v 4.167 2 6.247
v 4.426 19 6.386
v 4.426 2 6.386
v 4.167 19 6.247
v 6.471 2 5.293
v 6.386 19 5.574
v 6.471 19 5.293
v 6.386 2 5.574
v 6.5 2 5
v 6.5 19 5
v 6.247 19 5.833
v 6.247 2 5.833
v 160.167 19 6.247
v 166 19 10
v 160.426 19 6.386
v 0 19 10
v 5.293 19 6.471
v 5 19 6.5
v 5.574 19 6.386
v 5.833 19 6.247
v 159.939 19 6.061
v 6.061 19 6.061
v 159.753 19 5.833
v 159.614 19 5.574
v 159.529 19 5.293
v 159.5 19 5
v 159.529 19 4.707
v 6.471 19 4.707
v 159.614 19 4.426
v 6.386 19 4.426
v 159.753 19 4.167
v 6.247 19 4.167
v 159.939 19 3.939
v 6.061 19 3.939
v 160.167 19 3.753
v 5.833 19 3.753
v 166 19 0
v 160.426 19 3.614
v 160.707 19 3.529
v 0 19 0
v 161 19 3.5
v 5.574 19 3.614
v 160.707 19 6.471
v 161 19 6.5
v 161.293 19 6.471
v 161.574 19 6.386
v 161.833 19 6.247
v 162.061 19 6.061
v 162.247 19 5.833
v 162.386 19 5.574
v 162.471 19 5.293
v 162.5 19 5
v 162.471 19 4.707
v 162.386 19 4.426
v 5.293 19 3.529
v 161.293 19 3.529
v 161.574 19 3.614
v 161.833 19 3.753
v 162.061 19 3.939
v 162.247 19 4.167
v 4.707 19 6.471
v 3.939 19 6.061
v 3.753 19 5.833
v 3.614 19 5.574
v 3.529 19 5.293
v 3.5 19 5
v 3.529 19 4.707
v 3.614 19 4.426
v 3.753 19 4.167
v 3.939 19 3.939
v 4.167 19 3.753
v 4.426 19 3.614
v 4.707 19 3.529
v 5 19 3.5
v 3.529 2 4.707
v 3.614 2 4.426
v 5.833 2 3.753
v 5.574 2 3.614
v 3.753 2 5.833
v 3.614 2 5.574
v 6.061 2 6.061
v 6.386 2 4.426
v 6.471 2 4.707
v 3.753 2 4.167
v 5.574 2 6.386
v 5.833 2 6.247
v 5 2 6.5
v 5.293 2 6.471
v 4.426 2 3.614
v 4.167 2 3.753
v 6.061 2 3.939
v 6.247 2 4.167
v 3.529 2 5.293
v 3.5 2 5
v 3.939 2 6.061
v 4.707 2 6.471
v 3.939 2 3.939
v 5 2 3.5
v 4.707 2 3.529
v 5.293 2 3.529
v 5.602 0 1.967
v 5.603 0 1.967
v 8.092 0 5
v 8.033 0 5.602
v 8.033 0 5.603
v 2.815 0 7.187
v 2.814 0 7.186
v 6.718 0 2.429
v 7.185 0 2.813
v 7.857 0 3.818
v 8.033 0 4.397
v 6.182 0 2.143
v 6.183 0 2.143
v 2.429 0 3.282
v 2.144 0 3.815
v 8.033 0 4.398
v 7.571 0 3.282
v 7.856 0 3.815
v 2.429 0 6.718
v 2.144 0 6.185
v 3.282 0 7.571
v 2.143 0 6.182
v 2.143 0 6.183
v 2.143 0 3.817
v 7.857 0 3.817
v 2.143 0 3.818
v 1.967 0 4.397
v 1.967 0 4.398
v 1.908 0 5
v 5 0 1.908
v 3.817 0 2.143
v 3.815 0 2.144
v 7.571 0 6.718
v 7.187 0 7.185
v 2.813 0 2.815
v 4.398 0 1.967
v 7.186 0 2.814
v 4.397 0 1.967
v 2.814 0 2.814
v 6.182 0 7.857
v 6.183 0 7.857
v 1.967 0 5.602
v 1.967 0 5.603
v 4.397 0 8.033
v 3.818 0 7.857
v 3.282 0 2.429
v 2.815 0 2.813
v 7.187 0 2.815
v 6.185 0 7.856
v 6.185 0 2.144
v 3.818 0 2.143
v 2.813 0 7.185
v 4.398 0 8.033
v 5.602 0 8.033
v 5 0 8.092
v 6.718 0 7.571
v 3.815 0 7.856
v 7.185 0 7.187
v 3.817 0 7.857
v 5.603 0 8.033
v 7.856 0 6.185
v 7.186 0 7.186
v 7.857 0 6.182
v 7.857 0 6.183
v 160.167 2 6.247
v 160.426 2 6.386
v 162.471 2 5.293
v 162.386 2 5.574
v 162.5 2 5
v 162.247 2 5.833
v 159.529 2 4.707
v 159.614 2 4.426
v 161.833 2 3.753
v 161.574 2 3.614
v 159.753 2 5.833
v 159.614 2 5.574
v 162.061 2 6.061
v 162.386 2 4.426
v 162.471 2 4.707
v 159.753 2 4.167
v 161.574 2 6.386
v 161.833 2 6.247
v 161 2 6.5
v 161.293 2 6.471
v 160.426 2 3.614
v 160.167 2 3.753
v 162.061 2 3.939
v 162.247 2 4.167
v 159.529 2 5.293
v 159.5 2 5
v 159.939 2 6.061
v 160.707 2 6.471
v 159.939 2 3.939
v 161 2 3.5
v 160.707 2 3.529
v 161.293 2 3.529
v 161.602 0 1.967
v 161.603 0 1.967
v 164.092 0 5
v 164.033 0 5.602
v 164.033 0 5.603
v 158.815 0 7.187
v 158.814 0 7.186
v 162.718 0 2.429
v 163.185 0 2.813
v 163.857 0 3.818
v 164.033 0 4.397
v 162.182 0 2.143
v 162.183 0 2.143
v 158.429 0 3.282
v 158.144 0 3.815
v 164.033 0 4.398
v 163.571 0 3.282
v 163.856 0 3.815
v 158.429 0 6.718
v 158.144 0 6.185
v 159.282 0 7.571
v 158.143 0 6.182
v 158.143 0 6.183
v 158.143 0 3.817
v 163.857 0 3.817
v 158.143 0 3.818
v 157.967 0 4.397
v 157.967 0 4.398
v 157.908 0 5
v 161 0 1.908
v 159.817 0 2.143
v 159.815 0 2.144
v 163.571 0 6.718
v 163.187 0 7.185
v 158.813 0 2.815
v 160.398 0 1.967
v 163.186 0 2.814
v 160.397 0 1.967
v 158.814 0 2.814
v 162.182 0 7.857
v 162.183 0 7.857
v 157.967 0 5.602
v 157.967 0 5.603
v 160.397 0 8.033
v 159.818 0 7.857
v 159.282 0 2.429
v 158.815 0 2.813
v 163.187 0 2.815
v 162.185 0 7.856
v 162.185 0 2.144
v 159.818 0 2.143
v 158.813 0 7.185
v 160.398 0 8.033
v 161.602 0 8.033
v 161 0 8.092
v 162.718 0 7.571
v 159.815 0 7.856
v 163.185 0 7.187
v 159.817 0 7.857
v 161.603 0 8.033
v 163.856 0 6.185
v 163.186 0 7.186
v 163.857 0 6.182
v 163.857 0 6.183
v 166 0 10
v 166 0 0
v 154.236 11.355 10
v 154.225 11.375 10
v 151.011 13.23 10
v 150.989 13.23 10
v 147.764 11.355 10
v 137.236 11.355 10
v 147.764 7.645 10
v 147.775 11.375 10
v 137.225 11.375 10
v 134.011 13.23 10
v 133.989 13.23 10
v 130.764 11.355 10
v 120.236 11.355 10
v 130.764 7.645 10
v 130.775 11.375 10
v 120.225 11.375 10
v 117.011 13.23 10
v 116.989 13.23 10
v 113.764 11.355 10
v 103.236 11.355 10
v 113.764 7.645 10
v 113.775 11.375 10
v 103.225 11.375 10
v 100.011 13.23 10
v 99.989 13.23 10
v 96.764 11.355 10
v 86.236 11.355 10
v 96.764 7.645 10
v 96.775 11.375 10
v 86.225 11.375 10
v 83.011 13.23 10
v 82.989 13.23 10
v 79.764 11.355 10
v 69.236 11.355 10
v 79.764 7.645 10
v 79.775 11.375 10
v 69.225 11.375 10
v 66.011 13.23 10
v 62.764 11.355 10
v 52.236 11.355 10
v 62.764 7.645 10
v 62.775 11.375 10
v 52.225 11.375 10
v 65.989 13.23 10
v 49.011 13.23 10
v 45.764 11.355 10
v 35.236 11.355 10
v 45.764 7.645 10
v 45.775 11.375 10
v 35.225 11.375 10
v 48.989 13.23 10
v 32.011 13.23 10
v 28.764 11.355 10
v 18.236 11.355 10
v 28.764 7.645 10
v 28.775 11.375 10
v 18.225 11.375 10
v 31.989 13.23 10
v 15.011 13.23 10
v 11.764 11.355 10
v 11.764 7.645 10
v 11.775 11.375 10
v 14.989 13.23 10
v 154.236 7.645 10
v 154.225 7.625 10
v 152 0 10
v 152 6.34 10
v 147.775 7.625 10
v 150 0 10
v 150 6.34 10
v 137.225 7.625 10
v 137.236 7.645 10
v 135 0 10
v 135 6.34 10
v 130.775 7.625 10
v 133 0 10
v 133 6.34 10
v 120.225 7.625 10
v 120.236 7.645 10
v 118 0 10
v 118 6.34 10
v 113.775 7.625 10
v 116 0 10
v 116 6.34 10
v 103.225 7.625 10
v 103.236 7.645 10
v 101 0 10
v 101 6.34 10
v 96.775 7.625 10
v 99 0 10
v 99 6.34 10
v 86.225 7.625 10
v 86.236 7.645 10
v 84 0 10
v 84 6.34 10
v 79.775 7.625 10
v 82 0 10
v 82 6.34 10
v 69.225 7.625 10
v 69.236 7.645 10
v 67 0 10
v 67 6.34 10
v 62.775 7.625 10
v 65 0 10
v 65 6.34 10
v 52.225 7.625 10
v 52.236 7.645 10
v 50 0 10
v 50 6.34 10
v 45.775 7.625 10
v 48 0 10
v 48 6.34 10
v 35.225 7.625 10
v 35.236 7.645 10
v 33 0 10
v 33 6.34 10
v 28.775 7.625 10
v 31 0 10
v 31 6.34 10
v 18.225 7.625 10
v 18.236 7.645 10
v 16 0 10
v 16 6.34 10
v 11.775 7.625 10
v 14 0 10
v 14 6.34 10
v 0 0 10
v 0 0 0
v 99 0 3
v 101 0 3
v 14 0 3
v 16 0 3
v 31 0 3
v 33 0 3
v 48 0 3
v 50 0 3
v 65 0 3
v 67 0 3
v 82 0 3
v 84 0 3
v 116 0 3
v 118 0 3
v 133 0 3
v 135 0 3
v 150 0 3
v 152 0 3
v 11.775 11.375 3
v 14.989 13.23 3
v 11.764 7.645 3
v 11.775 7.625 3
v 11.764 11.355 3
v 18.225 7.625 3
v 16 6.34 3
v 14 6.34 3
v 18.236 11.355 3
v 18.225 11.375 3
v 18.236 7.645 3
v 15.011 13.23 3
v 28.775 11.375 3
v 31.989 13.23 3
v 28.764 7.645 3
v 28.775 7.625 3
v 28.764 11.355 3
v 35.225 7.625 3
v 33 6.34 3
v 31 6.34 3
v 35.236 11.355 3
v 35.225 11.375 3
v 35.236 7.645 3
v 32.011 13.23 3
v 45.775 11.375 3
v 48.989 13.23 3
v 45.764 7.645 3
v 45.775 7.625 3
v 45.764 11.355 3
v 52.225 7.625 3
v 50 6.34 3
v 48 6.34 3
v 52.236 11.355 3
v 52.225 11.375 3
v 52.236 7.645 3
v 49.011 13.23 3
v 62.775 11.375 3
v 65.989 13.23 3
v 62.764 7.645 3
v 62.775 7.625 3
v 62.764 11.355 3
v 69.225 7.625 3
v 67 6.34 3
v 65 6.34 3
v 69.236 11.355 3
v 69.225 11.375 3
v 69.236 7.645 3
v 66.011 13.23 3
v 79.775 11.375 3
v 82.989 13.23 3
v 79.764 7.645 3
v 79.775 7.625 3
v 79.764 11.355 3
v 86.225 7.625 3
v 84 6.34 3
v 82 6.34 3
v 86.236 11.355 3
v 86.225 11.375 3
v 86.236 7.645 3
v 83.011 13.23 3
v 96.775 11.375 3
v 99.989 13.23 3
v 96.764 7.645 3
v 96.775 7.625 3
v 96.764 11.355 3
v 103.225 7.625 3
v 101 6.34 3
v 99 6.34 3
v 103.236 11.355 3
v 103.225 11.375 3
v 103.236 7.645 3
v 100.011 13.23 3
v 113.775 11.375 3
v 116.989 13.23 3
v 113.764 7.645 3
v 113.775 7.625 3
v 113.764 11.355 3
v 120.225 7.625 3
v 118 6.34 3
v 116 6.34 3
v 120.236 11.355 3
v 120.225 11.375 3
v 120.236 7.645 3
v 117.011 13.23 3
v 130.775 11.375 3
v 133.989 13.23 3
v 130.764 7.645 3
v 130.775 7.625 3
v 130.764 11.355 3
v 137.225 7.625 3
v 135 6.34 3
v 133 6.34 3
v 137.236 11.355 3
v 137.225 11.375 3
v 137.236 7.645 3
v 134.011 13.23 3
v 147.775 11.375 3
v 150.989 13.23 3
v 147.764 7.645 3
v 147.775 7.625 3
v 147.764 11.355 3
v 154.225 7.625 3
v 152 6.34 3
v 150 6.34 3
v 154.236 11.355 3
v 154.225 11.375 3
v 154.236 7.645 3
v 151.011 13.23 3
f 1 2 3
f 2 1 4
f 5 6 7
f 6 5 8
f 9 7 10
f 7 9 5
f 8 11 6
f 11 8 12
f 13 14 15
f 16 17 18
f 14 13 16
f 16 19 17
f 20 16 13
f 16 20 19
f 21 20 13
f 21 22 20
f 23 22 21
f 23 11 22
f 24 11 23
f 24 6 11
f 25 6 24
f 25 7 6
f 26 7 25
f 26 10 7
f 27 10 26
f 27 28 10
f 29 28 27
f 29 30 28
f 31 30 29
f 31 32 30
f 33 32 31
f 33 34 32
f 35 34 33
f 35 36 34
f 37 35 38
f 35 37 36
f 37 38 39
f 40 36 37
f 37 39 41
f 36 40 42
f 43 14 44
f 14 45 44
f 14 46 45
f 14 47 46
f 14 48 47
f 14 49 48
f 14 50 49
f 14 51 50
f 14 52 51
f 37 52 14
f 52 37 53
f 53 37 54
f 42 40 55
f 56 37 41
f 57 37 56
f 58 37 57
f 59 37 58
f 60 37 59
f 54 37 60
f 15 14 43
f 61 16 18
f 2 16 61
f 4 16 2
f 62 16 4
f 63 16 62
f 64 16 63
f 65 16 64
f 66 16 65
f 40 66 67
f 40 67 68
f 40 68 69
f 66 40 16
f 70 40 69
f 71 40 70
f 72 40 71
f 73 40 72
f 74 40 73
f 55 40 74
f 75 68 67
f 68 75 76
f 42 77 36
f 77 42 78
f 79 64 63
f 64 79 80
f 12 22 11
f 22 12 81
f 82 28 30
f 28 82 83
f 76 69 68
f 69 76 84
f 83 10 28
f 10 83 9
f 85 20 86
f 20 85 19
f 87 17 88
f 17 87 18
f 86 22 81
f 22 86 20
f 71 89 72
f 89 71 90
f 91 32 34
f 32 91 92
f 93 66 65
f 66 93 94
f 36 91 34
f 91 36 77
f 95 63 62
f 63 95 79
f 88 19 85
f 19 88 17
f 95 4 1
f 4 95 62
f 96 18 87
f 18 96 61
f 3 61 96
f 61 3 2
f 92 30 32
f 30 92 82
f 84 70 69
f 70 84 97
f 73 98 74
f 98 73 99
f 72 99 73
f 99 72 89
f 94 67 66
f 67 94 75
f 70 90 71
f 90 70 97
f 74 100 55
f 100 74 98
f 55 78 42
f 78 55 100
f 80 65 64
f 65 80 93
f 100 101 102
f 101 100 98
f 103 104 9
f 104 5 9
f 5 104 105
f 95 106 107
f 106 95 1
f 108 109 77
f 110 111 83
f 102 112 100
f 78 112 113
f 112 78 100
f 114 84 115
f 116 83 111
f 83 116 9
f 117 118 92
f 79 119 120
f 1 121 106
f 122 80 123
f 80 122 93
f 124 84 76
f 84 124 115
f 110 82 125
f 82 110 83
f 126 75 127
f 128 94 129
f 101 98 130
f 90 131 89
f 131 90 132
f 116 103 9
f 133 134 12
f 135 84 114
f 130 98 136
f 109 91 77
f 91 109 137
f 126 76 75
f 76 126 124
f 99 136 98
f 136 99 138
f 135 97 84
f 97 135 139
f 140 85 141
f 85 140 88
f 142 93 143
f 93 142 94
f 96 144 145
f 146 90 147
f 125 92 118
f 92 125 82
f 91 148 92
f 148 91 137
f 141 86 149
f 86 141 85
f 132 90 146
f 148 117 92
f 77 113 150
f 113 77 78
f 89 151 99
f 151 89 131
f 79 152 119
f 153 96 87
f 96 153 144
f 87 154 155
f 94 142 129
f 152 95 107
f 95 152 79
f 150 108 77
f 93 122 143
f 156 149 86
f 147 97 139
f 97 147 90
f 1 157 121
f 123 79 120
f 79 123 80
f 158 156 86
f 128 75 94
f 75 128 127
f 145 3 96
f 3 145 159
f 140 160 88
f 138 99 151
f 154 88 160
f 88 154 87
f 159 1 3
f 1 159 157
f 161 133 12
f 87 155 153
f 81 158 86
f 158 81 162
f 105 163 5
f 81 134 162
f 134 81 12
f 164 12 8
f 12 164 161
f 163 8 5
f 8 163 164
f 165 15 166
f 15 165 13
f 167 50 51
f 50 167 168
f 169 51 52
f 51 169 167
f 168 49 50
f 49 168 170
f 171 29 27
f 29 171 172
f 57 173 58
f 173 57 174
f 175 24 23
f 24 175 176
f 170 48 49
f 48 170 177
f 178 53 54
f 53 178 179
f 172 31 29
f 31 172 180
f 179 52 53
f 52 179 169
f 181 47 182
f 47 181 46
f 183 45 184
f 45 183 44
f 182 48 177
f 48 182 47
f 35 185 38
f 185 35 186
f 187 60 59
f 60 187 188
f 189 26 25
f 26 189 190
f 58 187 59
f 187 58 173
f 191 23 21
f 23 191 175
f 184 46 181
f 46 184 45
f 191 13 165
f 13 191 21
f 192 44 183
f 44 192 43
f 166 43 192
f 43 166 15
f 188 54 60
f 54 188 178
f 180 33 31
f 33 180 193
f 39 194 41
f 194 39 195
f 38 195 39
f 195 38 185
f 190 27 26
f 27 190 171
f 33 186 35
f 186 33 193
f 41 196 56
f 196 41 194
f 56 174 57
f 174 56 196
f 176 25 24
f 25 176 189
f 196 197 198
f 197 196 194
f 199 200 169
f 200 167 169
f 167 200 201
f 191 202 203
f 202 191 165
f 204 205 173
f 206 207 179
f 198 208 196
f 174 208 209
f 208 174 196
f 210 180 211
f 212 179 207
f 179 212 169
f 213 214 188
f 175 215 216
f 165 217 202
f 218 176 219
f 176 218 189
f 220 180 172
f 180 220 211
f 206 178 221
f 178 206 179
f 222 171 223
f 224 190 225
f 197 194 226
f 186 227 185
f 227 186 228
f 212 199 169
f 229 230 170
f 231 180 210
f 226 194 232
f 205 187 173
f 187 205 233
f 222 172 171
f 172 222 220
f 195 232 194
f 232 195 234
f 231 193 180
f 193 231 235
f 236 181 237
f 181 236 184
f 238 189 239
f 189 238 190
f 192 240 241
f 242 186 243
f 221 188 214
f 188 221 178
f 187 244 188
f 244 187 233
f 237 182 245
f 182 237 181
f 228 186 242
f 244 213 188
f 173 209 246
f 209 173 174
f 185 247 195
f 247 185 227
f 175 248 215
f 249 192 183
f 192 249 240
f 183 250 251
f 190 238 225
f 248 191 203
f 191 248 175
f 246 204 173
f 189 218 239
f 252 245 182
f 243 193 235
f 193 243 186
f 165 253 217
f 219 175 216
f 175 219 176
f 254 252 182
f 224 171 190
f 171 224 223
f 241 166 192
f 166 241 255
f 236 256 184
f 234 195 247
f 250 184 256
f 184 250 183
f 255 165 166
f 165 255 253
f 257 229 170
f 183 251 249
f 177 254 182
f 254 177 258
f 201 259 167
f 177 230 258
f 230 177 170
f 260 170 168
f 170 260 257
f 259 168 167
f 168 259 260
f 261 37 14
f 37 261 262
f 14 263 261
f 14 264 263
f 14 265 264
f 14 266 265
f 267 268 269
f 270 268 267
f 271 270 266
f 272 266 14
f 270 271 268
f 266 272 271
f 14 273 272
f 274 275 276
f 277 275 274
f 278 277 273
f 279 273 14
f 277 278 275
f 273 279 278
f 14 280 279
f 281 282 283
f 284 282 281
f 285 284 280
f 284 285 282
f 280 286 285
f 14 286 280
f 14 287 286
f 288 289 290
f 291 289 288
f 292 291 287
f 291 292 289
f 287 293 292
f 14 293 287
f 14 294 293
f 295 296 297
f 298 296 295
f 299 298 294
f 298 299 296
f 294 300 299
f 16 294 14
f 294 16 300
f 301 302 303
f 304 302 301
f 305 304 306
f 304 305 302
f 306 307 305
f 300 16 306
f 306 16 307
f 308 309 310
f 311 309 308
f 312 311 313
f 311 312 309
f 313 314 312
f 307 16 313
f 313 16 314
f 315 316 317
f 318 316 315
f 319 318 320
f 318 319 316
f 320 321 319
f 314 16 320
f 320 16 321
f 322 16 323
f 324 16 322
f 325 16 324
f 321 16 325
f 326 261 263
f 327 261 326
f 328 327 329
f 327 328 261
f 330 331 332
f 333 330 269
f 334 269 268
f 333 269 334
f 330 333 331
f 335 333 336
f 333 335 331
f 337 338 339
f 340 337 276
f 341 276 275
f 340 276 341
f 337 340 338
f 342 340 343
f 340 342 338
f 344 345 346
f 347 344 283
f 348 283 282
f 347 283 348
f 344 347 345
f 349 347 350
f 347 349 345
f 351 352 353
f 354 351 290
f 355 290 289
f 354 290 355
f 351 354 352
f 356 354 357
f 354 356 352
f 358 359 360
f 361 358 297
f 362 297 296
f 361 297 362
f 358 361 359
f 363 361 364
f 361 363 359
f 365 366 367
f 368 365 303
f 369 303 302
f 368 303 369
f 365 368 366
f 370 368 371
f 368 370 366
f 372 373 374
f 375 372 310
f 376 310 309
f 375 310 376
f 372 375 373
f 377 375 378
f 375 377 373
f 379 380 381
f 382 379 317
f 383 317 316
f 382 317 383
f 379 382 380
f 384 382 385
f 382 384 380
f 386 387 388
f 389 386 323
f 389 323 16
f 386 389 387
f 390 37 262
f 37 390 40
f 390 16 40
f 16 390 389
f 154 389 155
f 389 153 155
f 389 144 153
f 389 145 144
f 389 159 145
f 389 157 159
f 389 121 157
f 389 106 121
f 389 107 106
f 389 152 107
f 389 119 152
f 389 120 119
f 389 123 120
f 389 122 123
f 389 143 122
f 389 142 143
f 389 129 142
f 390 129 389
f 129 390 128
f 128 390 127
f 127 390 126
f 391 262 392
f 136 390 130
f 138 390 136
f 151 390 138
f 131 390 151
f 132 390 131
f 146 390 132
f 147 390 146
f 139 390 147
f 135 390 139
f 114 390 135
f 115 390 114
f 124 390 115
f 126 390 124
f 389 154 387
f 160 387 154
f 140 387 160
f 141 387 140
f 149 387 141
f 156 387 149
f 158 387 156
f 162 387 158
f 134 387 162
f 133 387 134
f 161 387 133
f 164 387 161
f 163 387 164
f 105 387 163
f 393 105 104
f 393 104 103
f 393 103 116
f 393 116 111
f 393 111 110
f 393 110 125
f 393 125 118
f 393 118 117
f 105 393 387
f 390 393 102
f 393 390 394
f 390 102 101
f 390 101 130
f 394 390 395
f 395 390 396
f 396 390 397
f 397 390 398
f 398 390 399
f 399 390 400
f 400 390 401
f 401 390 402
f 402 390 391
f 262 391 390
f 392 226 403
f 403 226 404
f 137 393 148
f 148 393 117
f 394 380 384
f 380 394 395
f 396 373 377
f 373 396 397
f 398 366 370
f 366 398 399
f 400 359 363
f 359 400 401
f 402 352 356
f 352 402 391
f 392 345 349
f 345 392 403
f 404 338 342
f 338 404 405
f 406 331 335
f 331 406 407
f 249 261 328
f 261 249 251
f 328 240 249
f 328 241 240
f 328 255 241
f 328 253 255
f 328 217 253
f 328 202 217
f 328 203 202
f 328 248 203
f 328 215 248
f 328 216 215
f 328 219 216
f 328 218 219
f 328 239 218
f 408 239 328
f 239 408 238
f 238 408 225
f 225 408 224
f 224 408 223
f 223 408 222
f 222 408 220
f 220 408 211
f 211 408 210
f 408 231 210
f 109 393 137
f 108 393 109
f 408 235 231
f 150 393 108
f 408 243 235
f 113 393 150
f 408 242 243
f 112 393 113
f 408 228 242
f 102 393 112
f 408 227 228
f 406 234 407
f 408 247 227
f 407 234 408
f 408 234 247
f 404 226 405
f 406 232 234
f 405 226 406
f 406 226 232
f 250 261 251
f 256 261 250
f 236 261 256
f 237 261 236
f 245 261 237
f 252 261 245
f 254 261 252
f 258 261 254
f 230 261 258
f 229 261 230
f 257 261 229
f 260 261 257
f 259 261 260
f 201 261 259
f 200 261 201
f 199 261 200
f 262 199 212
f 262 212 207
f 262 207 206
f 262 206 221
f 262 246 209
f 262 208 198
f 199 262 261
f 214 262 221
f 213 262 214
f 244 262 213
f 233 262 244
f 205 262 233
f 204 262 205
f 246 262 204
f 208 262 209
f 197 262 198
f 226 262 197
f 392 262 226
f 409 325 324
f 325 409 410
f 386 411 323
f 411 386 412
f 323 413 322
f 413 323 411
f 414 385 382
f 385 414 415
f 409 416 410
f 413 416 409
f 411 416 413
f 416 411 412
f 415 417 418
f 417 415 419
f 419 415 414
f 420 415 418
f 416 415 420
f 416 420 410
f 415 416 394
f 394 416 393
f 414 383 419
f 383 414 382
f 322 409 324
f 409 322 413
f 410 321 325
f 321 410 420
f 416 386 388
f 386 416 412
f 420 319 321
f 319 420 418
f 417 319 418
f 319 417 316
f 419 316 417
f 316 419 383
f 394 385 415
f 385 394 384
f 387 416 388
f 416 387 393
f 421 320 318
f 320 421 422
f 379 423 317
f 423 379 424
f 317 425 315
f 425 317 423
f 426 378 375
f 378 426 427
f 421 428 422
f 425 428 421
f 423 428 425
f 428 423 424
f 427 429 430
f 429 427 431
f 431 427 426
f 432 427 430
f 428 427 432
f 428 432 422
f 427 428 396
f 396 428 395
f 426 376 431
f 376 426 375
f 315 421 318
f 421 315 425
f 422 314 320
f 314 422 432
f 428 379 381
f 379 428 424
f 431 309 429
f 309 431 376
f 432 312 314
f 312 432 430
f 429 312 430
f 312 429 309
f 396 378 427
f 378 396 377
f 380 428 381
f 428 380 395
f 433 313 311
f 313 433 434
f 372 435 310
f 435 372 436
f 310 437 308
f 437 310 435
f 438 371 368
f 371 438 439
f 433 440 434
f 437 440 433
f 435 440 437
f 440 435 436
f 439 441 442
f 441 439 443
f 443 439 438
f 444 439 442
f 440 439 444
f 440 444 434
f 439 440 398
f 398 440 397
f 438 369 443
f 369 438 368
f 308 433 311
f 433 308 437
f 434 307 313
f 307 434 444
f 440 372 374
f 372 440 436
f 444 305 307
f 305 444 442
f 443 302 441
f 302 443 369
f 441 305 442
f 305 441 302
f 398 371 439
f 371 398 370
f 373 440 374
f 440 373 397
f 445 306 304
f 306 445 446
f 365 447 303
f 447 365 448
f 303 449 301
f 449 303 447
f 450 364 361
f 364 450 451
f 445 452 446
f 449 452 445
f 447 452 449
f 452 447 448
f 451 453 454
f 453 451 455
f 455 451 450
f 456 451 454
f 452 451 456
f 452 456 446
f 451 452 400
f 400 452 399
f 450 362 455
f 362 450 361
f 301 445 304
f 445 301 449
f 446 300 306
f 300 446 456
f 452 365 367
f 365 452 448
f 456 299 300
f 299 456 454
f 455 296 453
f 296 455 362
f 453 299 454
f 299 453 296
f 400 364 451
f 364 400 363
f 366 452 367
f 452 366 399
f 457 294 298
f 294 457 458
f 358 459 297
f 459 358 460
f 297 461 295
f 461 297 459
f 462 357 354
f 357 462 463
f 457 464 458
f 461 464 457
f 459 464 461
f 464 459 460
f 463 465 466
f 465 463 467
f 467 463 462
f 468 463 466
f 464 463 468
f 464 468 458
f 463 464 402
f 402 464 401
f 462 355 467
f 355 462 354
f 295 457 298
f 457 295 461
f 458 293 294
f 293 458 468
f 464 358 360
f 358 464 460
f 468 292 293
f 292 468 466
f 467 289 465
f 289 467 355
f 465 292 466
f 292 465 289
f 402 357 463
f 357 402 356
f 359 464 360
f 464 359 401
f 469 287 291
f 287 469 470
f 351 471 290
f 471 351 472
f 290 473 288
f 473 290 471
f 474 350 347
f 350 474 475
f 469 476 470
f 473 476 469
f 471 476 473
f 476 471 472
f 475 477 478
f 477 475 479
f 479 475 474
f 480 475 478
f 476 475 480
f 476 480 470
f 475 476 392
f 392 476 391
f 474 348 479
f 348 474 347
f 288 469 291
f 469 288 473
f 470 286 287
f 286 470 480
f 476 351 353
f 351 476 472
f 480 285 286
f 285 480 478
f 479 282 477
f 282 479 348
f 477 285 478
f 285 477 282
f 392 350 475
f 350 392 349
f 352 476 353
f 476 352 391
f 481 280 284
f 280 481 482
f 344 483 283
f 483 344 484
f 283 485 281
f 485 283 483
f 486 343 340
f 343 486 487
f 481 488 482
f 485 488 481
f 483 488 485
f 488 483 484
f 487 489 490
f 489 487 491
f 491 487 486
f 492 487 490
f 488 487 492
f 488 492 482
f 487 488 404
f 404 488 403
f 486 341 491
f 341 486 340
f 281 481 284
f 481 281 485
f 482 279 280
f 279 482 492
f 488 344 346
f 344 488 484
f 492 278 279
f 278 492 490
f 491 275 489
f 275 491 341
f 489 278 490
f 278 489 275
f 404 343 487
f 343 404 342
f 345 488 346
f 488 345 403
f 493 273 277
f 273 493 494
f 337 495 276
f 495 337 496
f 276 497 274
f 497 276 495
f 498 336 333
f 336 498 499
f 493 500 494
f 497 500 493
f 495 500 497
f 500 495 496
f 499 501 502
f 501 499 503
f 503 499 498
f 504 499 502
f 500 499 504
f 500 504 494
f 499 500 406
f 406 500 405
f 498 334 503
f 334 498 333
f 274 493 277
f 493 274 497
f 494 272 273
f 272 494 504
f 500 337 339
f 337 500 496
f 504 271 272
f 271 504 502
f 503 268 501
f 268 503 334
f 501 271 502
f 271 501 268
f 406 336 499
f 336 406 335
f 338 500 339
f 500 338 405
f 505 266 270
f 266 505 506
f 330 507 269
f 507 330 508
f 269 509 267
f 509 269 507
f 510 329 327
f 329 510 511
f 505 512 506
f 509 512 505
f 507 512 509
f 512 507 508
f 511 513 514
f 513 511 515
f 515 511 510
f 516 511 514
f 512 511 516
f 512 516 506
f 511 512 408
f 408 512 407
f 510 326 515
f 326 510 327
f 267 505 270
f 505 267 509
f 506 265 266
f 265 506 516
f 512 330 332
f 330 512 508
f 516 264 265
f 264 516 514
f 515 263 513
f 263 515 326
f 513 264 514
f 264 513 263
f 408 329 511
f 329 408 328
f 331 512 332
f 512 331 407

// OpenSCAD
bit_count = 8;
bit_max_dia = 15;
bit_spacing = 2;

screw_shaft_dia = 3;
screw_head_dia = 6.2; // 6 + 0.2 slack
screw_head_angle_height = 2; // 1.8 + 0.2 slack

mounting_width = 14;

$fn = 32;

// derived values, do not edit
bar_width = ((bit_max_dia + bit_spacing) * bit_count) + 2 * max(bit_max_dia, mounting_width);
start_offset = max(bit_max_dia, mounting_width);

module mounting_bar() {
    difference() {
        hole_offset = start_offset / 3;
        cube([bar_width, bit_max_dia + 2 * bit_spacing, 10]);
        translate([hole_offset, bit_max_dia + 2 * bit_spacing, 5])
            mounting_screw(length = bit_max_dia + 2 * bit_spacing);
        translate([bar_width - hole_offset, bit_max_dia + 2 * bit_spacing, 5])
            mounting_screw(length = bit_max_dia + 2 * bit_spacing);
        
    }    
}    
    
module mounting_screw(length) {
    rotate([90, 0, 0]) {
        cylinder(d = screw_shaft_dia, h = length);
        translate([0, 0, length - screw_head_angle_height])
            cylinder(d2 = screw_head_dia, d1 = screw_shaft_dia, h = screw_head_angle_height + 0.01);
    }
}
    
module quarter_inch_hex_cutout(h = 1) {
    hex_width = 3.75;
    hex_length = 6.45;
    translate([0, 0, h/2]) {
        hull() {
            cube([hex_length, hex_width, h], center = true);
            rotate([0, 0, 60])
                cube([hex_length, hex_width, h], center = true);
            rotate([0, 0, 120])
                cube([hex_length, hex_width, h], center = true);
        }
    }
}

module bit_holder() {
    difference() {
        mounting_bar();
        for(i = [0:bit_count]) {
            translate([start_offset + i * (bit_max_dia + bit_spacing), (bit_max_dia + 2 * bit_spacing)/2, 3])
                quarter_inch_hex_cutout(h = 7.1);
            translate([start_offset + i * (bit_max_dia + bit_spacing) - 1, 0, 3])
                cube([2, (bit_max_dia + 2 * bit_spacing)/2, 7.1]);
        }
    }
}


bit_holder();
